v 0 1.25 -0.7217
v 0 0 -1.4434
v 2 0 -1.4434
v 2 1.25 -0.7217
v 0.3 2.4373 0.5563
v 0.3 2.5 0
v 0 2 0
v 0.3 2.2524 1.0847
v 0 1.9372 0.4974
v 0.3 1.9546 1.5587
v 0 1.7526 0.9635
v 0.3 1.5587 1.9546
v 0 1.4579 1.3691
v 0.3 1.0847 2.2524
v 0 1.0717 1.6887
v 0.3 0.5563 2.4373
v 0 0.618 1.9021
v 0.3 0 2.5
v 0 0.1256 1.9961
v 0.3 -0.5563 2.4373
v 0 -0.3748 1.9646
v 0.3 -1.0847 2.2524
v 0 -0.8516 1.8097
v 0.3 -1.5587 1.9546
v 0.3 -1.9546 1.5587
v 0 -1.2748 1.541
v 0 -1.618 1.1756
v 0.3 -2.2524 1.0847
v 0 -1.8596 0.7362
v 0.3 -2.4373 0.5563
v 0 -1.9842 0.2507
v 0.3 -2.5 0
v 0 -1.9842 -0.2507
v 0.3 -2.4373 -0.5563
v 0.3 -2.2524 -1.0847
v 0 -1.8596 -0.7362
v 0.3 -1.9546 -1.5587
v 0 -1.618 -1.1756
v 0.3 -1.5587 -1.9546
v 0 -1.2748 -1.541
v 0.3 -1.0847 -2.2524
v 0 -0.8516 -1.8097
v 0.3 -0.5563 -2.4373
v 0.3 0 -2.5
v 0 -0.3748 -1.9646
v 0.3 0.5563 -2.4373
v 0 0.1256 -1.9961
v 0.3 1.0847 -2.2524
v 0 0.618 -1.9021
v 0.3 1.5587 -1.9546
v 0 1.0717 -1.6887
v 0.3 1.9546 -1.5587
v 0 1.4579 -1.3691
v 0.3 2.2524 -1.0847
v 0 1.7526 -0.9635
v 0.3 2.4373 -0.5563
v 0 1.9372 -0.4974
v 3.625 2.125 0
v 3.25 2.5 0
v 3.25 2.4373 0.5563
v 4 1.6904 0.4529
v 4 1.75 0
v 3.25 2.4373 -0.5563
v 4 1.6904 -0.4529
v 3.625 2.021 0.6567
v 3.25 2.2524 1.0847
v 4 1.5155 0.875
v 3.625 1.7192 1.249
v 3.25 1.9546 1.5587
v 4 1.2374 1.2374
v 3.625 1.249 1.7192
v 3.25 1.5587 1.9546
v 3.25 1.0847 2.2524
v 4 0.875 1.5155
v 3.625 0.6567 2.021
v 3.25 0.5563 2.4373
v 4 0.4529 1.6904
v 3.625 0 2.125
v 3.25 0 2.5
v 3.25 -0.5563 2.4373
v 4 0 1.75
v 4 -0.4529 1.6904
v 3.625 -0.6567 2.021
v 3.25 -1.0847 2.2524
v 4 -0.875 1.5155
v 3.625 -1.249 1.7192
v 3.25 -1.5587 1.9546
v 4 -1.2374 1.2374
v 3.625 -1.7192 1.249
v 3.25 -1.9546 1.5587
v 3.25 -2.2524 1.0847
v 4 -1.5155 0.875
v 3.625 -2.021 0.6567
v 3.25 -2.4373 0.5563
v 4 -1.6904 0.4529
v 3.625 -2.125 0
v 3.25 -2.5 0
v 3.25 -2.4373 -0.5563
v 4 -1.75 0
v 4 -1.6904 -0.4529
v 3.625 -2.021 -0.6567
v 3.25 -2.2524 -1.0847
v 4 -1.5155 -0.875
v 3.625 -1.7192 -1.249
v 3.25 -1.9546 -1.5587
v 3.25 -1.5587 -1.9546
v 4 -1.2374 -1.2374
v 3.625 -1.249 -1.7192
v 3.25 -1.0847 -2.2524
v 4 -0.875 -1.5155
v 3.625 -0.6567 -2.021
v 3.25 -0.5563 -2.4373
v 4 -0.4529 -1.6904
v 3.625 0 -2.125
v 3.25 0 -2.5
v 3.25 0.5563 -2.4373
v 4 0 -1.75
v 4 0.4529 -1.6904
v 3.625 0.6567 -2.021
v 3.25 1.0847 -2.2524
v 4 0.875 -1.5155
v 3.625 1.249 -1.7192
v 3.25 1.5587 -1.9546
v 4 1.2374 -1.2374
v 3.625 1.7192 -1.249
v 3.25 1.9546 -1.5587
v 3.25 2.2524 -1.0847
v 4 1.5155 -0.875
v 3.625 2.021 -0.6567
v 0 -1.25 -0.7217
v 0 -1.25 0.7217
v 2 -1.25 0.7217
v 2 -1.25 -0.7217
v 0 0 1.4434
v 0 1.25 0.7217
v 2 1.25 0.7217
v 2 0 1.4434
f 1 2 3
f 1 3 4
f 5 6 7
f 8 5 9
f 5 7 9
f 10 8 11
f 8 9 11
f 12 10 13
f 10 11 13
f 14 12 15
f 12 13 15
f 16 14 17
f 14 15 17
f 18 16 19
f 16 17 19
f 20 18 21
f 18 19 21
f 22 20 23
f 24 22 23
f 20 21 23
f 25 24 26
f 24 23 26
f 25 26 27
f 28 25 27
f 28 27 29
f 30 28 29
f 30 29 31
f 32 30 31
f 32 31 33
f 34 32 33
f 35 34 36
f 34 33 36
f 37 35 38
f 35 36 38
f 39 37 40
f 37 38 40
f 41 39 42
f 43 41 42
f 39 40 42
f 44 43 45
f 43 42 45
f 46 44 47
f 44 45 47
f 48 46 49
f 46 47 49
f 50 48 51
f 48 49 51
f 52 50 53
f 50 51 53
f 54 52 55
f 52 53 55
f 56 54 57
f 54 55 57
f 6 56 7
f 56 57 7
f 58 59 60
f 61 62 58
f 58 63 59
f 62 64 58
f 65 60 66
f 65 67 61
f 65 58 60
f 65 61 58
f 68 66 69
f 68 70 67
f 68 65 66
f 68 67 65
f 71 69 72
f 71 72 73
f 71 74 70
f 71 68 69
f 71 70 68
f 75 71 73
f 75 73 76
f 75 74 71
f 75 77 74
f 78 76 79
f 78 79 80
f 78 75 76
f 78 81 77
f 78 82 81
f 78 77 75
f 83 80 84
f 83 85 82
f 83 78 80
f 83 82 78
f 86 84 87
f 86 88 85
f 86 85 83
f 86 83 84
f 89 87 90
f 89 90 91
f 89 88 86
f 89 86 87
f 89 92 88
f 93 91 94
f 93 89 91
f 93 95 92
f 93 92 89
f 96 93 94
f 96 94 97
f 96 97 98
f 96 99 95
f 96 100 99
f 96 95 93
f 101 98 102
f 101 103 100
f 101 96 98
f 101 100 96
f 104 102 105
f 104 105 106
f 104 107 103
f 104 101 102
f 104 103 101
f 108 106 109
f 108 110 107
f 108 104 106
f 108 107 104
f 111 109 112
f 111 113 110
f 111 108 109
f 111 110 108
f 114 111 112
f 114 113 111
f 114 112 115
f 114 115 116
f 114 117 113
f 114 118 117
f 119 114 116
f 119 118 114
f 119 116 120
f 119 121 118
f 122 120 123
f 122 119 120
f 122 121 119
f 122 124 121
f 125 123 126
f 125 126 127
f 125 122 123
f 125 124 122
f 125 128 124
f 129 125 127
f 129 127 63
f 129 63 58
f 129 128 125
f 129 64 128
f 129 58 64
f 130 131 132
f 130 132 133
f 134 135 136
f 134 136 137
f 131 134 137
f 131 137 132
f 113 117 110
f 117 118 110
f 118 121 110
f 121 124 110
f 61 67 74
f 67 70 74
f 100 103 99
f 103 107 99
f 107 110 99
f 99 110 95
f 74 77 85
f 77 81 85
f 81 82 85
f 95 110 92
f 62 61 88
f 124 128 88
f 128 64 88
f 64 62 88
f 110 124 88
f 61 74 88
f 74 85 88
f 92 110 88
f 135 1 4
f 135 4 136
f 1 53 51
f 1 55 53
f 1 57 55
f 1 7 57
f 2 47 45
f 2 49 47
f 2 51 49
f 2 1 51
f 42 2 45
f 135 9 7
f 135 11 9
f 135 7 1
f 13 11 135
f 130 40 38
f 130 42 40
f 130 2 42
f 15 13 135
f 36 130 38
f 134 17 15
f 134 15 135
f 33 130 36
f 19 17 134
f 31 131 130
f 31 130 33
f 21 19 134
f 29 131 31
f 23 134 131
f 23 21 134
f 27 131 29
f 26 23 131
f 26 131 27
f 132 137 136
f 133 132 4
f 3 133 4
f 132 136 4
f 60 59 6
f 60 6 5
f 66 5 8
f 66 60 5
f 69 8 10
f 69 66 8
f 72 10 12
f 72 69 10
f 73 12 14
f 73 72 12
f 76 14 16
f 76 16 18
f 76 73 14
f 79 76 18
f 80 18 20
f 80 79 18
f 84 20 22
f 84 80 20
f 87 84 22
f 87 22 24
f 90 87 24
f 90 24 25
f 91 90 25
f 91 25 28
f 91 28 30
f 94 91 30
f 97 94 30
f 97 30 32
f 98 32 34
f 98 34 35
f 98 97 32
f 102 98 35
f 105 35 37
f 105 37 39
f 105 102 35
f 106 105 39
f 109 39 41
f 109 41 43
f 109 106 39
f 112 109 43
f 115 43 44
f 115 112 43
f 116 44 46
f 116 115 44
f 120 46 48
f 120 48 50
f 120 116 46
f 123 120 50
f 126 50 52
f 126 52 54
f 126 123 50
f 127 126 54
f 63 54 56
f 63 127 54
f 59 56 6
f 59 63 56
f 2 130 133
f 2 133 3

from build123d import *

# Parameters (mm, degrees)
SKETCH1_W          = 4
SKETCH1_H          = 2.5
CUT_EXTRUDE1_DEPTH = 2
CHAMFER1_SIZE      = 0.75
CHAMFER2_SIZE      = 0.3
CHAMFER2_SIZE2     = 0.5


with BuildPart() as part:
    # Sketch1 → Revolve1 (revolve)
    with BuildSketch(Plane.XY):
        with Locations((2, 1.25)):
            Rectangle(SKETCH1_W, SKETCH1_H)
    revolve(axis=Axis((-0.394679187, 0, 0), (1, 0, 0)))

    # Sketch2 → Cut-Extrude1 (cut)
    with BuildSketch(Plane(origin=(0, 0, 0), x_dir=(0, 0, -1), z_dir=(1, 0, 0))):
        Polygon((-0.721687836, 1.25), (-1.443375673, 0), (-0.721687836, -1.25), (0.721687836, -1.25), (1.443375673, 0), (0.721687836, 1.25), align=None)
    extrude(amount=CUT_EXTRUDE1_DEPTH, mode=Mode.SUBTRACT)

    # Chamfer1
    chamfer1_edges = [part.edges().sort_by_distance(p)[0] for p in [
        (4, -2.5, 0),
    ]]
    chamfer(chamfer1_edges, length=CHAMFER1_SIZE)

    # Chamfer2
    chamfer2_edges = [part.edges().sort_by_distance(p)[0] for p in [
        (0, -2.5, 0),
    ]]
    chamfer2_side = [part.faces().sort_by_distance(p)[0] for p in [
        (1.625, -2.5, 0),
    ]]
    chamfer(chamfer2_edges, length=CHAMFER2_SIZE, length2=CHAMFER2_SIZE2, reference=chamfer2_side[0])


solid = part.part
